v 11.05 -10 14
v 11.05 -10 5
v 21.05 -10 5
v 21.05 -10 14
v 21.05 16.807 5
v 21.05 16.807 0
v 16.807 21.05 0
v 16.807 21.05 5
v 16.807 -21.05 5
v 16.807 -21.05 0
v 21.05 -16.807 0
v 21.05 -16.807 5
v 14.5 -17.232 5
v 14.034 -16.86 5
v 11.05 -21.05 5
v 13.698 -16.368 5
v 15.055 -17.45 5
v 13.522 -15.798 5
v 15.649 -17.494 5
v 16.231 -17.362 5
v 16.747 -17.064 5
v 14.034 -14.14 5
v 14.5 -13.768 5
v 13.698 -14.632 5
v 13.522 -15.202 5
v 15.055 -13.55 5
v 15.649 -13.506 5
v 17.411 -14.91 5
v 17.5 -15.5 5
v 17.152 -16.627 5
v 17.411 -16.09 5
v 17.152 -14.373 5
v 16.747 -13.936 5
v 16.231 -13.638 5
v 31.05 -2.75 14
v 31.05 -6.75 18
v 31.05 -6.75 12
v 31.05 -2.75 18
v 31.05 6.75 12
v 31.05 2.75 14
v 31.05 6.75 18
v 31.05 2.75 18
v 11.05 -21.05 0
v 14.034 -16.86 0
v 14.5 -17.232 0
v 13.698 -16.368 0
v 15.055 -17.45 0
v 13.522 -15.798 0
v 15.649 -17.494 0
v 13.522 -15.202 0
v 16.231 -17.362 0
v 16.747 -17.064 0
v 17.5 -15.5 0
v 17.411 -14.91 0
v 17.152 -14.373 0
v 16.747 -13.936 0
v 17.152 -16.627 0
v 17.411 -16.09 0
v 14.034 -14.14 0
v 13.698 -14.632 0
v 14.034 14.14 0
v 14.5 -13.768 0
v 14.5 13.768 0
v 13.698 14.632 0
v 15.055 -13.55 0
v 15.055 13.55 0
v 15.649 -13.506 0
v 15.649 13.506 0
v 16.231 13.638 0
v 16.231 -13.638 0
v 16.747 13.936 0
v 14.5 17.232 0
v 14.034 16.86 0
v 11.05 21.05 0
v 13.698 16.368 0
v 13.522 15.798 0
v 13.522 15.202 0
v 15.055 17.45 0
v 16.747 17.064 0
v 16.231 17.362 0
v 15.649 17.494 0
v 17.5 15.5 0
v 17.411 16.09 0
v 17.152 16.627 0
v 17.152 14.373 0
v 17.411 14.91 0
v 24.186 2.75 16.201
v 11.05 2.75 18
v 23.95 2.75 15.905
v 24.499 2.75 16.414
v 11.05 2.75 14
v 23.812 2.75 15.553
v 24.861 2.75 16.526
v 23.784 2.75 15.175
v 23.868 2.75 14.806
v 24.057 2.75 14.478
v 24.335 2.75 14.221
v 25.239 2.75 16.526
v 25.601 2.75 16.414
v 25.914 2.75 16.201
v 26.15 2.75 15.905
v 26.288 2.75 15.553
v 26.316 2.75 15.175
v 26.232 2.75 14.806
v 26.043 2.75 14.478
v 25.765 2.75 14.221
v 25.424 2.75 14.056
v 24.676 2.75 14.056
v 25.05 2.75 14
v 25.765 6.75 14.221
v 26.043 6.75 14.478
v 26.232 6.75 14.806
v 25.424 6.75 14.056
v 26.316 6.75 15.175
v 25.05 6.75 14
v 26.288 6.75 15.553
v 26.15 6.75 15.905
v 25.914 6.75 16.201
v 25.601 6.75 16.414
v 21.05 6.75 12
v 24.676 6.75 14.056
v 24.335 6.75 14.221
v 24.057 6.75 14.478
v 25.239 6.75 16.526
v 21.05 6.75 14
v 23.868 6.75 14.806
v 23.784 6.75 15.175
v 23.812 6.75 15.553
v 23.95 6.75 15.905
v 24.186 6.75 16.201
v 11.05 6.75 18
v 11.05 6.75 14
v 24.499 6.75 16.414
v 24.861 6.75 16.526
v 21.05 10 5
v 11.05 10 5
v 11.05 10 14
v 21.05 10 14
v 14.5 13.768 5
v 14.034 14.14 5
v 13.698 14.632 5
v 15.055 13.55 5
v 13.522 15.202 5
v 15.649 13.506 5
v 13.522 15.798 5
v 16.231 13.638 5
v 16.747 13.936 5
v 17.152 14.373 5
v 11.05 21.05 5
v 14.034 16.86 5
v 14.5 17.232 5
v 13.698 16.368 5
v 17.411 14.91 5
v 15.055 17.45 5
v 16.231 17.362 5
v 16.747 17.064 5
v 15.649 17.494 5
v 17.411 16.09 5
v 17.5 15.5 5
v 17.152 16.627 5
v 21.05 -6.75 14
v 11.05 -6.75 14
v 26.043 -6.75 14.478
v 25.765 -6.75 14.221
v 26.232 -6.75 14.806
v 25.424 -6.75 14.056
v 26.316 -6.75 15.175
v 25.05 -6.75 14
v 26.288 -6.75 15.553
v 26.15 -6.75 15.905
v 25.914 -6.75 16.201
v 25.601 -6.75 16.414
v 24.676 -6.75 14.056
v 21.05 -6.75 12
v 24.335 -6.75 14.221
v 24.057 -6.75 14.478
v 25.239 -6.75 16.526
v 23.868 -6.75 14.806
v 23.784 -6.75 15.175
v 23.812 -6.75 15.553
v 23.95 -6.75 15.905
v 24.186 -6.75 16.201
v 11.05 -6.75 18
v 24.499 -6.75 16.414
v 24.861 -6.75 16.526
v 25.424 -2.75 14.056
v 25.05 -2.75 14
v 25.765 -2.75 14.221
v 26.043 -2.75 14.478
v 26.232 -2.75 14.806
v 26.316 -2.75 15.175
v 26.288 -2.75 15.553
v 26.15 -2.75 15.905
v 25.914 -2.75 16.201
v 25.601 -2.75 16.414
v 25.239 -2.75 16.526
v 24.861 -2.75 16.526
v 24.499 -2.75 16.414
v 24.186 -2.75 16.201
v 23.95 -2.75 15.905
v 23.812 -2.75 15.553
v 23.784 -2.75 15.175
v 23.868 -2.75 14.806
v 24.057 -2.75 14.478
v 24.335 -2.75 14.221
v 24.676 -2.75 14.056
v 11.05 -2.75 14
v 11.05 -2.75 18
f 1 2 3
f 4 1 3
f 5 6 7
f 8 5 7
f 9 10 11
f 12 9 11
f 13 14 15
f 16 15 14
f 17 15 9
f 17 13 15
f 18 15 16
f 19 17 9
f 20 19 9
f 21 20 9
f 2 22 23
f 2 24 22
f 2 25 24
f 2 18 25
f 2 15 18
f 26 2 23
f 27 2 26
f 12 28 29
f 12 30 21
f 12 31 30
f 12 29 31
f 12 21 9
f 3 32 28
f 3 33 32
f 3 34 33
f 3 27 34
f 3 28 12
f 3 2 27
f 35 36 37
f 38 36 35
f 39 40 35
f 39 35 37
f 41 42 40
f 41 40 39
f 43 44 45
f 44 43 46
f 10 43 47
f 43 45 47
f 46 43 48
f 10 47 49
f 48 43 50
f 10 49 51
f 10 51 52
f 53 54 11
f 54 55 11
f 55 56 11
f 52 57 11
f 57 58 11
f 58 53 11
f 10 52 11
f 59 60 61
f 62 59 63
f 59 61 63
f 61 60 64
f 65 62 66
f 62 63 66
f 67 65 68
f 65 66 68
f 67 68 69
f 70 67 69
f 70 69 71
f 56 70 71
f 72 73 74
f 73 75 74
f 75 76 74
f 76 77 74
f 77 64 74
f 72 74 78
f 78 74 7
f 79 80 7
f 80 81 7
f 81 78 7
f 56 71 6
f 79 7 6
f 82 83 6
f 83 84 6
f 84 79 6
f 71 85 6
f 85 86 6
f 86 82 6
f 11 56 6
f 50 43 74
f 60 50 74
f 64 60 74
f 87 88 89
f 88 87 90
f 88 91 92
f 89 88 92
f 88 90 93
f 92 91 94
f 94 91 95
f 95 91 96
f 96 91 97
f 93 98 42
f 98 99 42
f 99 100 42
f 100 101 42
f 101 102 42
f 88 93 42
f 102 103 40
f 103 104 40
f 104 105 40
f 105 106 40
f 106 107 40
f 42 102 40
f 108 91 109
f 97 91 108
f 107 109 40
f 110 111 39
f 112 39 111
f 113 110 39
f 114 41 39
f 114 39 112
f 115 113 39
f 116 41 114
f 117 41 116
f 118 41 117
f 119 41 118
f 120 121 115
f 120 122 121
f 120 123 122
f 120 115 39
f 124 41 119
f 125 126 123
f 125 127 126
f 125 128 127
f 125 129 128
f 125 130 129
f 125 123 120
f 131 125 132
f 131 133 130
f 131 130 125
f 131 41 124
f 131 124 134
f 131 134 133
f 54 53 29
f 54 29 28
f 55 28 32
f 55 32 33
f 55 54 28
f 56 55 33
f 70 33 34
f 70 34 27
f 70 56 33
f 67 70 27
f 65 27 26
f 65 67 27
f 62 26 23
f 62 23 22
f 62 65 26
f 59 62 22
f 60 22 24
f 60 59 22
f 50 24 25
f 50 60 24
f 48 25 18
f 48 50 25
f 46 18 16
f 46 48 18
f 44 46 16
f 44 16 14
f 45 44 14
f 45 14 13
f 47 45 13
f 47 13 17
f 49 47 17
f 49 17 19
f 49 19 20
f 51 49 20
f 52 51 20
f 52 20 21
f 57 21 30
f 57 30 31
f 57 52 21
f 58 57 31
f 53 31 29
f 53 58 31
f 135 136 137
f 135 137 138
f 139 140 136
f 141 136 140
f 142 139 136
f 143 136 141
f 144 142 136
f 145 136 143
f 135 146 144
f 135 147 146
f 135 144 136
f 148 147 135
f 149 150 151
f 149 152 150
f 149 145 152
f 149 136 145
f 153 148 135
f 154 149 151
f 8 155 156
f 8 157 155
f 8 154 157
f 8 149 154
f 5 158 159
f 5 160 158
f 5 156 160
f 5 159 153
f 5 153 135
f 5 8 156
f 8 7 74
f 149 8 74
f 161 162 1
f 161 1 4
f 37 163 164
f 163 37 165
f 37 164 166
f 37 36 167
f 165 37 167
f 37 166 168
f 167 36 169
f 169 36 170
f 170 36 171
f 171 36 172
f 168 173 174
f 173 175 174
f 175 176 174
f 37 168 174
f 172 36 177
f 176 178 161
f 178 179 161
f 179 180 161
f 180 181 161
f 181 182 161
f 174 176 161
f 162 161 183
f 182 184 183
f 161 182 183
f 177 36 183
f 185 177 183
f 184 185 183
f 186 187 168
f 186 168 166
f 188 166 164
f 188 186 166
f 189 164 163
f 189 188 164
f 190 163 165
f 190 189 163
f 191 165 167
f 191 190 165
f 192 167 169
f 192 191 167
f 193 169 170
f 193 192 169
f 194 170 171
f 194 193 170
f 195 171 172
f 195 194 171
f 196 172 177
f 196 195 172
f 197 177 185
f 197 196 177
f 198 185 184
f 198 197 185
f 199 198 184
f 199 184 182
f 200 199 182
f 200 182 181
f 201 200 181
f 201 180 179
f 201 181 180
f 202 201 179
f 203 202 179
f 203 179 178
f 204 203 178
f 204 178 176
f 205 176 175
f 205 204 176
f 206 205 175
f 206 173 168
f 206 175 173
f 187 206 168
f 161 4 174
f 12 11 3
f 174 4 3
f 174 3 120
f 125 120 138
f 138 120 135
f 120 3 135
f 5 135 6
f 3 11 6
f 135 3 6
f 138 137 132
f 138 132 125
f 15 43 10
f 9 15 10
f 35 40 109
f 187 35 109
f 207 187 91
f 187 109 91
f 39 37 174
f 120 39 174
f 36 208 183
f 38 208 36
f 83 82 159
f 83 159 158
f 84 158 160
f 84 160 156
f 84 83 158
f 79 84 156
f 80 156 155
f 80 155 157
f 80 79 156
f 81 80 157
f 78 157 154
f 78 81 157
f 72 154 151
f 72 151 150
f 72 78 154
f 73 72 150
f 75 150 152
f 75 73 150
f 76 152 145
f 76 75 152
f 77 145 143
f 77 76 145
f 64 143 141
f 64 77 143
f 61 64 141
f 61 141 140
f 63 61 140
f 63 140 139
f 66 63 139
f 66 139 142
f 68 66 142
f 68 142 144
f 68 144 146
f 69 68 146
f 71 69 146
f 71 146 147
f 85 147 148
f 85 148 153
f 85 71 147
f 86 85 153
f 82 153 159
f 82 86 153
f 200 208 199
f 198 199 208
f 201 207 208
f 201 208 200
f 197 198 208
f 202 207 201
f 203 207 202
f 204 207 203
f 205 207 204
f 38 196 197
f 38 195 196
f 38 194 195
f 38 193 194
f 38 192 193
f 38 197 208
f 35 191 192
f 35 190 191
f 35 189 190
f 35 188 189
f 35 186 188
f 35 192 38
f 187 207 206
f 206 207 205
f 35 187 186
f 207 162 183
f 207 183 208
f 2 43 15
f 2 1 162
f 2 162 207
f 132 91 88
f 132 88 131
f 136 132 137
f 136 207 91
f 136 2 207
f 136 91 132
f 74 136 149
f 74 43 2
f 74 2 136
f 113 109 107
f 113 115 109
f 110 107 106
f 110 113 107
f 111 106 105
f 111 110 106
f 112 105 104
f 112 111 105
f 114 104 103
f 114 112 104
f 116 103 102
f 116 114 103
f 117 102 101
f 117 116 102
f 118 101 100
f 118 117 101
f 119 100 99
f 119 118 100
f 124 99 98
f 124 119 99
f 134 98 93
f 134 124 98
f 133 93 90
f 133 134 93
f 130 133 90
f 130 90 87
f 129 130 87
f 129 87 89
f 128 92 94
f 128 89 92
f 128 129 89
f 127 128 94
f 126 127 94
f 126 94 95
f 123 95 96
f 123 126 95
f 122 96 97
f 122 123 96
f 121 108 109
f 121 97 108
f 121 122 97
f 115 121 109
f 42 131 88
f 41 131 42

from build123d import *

# Parameters (mm, degrees)
SKETCH1_R               = 2
BOSS_EXTRUDE1_DEPTH     = 5
SKETCH2_W               = 10
SKETCH2_H               = 20
BOSS_EXTRUDE2_DEPTH     = 9
SKETCH3_W               = 20
SKETCH3_H               = 4
BOSS_EXTRUDE3_DEPTH     = 4
SKETCH4_W               = 10
SKETCH4_H               = 13.5
BOSS_EXTRUDE4_DEPTH     = 2
CUT_EXTRUDE1_DEPTH      = 46.397604562
CUT_EXTRUDE1_DEPTH_BACK = 46.397604562
SKETCH5_R               = 1.27


with BuildPart() as part:
    # Sketch1 → Boss-Extrude1 (new body)
    with BuildSketch(Plane.XY):
        Polygon((16.807359313, 21.05), (11.05, 21.05), (11.05, -21.05), (16.807359313, -21.05), (21.05, -16.807359313), (21.05, 16.807359313), align=None)
        with Locations((15.5, -15.5)):
            Circle(SKETCH1_R, mode=Mode.SUBTRACT)
        with Locations((15.5, 15.5)):
            Circle(SKETCH1_R, mode=Mode.SUBTRACT)
    extrude(amount=BOSS_EXTRUDE1_DEPTH)

    # Sketch2 → Boss-Extrude2 (add)
    with BuildSketch(Plane.XY.offset(5)):
        with Locations((16.05, 0)):
            Rectangle(SKETCH2_W, SKETCH2_H)
    extrude(amount=BOSS_EXTRUDE2_DEPTH)

    # Sketch3 → Boss-Extrude3 (add)
    with BuildSketch(Plane.XY.offset(14)):
        with Locations((21.05, 4.75)):
            Rectangle(SKETCH3_W, SKETCH3_H)
        with Locations((21.05, -4.75)):
            Rectangle(SKETCH3_W, SKETCH3_H)
    extrude(amount=BOSS_EXTRUDE3_DEPTH)

    # Sketch4 → Boss-Extrude4 (add)
    with BuildSketch(Plane(origin=(0, 0, 14), x_dir=(-1, 0, 0), z_dir=(0, 0, -1))):
        with Locations((-26.05, 0)):
            Rectangle(SKETCH4_W, SKETCH4_H)
    extrude(amount=BOSS_EXTRUDE4_DEPTH)

    # Sketch5 → Cut-Extrude1 (cut, two sides: drawn at the far end of the back side and taken through both)
    with BuildSketch(Plane.XZ.offset(6.75).offset(-CUT_EXTRUDE1_DEPTH_BACK)):
        with Locations(Location((25.05, 15.27, 0), (0, 0, 270))):
            Circle(SKETCH5_R)
    extrude(amount=CUT_EXTRUDE1_DEPTH + CUT_EXTRUDE1_DEPTH_BACK, mode=Mode.SUBTRACT)


solid = part.part
